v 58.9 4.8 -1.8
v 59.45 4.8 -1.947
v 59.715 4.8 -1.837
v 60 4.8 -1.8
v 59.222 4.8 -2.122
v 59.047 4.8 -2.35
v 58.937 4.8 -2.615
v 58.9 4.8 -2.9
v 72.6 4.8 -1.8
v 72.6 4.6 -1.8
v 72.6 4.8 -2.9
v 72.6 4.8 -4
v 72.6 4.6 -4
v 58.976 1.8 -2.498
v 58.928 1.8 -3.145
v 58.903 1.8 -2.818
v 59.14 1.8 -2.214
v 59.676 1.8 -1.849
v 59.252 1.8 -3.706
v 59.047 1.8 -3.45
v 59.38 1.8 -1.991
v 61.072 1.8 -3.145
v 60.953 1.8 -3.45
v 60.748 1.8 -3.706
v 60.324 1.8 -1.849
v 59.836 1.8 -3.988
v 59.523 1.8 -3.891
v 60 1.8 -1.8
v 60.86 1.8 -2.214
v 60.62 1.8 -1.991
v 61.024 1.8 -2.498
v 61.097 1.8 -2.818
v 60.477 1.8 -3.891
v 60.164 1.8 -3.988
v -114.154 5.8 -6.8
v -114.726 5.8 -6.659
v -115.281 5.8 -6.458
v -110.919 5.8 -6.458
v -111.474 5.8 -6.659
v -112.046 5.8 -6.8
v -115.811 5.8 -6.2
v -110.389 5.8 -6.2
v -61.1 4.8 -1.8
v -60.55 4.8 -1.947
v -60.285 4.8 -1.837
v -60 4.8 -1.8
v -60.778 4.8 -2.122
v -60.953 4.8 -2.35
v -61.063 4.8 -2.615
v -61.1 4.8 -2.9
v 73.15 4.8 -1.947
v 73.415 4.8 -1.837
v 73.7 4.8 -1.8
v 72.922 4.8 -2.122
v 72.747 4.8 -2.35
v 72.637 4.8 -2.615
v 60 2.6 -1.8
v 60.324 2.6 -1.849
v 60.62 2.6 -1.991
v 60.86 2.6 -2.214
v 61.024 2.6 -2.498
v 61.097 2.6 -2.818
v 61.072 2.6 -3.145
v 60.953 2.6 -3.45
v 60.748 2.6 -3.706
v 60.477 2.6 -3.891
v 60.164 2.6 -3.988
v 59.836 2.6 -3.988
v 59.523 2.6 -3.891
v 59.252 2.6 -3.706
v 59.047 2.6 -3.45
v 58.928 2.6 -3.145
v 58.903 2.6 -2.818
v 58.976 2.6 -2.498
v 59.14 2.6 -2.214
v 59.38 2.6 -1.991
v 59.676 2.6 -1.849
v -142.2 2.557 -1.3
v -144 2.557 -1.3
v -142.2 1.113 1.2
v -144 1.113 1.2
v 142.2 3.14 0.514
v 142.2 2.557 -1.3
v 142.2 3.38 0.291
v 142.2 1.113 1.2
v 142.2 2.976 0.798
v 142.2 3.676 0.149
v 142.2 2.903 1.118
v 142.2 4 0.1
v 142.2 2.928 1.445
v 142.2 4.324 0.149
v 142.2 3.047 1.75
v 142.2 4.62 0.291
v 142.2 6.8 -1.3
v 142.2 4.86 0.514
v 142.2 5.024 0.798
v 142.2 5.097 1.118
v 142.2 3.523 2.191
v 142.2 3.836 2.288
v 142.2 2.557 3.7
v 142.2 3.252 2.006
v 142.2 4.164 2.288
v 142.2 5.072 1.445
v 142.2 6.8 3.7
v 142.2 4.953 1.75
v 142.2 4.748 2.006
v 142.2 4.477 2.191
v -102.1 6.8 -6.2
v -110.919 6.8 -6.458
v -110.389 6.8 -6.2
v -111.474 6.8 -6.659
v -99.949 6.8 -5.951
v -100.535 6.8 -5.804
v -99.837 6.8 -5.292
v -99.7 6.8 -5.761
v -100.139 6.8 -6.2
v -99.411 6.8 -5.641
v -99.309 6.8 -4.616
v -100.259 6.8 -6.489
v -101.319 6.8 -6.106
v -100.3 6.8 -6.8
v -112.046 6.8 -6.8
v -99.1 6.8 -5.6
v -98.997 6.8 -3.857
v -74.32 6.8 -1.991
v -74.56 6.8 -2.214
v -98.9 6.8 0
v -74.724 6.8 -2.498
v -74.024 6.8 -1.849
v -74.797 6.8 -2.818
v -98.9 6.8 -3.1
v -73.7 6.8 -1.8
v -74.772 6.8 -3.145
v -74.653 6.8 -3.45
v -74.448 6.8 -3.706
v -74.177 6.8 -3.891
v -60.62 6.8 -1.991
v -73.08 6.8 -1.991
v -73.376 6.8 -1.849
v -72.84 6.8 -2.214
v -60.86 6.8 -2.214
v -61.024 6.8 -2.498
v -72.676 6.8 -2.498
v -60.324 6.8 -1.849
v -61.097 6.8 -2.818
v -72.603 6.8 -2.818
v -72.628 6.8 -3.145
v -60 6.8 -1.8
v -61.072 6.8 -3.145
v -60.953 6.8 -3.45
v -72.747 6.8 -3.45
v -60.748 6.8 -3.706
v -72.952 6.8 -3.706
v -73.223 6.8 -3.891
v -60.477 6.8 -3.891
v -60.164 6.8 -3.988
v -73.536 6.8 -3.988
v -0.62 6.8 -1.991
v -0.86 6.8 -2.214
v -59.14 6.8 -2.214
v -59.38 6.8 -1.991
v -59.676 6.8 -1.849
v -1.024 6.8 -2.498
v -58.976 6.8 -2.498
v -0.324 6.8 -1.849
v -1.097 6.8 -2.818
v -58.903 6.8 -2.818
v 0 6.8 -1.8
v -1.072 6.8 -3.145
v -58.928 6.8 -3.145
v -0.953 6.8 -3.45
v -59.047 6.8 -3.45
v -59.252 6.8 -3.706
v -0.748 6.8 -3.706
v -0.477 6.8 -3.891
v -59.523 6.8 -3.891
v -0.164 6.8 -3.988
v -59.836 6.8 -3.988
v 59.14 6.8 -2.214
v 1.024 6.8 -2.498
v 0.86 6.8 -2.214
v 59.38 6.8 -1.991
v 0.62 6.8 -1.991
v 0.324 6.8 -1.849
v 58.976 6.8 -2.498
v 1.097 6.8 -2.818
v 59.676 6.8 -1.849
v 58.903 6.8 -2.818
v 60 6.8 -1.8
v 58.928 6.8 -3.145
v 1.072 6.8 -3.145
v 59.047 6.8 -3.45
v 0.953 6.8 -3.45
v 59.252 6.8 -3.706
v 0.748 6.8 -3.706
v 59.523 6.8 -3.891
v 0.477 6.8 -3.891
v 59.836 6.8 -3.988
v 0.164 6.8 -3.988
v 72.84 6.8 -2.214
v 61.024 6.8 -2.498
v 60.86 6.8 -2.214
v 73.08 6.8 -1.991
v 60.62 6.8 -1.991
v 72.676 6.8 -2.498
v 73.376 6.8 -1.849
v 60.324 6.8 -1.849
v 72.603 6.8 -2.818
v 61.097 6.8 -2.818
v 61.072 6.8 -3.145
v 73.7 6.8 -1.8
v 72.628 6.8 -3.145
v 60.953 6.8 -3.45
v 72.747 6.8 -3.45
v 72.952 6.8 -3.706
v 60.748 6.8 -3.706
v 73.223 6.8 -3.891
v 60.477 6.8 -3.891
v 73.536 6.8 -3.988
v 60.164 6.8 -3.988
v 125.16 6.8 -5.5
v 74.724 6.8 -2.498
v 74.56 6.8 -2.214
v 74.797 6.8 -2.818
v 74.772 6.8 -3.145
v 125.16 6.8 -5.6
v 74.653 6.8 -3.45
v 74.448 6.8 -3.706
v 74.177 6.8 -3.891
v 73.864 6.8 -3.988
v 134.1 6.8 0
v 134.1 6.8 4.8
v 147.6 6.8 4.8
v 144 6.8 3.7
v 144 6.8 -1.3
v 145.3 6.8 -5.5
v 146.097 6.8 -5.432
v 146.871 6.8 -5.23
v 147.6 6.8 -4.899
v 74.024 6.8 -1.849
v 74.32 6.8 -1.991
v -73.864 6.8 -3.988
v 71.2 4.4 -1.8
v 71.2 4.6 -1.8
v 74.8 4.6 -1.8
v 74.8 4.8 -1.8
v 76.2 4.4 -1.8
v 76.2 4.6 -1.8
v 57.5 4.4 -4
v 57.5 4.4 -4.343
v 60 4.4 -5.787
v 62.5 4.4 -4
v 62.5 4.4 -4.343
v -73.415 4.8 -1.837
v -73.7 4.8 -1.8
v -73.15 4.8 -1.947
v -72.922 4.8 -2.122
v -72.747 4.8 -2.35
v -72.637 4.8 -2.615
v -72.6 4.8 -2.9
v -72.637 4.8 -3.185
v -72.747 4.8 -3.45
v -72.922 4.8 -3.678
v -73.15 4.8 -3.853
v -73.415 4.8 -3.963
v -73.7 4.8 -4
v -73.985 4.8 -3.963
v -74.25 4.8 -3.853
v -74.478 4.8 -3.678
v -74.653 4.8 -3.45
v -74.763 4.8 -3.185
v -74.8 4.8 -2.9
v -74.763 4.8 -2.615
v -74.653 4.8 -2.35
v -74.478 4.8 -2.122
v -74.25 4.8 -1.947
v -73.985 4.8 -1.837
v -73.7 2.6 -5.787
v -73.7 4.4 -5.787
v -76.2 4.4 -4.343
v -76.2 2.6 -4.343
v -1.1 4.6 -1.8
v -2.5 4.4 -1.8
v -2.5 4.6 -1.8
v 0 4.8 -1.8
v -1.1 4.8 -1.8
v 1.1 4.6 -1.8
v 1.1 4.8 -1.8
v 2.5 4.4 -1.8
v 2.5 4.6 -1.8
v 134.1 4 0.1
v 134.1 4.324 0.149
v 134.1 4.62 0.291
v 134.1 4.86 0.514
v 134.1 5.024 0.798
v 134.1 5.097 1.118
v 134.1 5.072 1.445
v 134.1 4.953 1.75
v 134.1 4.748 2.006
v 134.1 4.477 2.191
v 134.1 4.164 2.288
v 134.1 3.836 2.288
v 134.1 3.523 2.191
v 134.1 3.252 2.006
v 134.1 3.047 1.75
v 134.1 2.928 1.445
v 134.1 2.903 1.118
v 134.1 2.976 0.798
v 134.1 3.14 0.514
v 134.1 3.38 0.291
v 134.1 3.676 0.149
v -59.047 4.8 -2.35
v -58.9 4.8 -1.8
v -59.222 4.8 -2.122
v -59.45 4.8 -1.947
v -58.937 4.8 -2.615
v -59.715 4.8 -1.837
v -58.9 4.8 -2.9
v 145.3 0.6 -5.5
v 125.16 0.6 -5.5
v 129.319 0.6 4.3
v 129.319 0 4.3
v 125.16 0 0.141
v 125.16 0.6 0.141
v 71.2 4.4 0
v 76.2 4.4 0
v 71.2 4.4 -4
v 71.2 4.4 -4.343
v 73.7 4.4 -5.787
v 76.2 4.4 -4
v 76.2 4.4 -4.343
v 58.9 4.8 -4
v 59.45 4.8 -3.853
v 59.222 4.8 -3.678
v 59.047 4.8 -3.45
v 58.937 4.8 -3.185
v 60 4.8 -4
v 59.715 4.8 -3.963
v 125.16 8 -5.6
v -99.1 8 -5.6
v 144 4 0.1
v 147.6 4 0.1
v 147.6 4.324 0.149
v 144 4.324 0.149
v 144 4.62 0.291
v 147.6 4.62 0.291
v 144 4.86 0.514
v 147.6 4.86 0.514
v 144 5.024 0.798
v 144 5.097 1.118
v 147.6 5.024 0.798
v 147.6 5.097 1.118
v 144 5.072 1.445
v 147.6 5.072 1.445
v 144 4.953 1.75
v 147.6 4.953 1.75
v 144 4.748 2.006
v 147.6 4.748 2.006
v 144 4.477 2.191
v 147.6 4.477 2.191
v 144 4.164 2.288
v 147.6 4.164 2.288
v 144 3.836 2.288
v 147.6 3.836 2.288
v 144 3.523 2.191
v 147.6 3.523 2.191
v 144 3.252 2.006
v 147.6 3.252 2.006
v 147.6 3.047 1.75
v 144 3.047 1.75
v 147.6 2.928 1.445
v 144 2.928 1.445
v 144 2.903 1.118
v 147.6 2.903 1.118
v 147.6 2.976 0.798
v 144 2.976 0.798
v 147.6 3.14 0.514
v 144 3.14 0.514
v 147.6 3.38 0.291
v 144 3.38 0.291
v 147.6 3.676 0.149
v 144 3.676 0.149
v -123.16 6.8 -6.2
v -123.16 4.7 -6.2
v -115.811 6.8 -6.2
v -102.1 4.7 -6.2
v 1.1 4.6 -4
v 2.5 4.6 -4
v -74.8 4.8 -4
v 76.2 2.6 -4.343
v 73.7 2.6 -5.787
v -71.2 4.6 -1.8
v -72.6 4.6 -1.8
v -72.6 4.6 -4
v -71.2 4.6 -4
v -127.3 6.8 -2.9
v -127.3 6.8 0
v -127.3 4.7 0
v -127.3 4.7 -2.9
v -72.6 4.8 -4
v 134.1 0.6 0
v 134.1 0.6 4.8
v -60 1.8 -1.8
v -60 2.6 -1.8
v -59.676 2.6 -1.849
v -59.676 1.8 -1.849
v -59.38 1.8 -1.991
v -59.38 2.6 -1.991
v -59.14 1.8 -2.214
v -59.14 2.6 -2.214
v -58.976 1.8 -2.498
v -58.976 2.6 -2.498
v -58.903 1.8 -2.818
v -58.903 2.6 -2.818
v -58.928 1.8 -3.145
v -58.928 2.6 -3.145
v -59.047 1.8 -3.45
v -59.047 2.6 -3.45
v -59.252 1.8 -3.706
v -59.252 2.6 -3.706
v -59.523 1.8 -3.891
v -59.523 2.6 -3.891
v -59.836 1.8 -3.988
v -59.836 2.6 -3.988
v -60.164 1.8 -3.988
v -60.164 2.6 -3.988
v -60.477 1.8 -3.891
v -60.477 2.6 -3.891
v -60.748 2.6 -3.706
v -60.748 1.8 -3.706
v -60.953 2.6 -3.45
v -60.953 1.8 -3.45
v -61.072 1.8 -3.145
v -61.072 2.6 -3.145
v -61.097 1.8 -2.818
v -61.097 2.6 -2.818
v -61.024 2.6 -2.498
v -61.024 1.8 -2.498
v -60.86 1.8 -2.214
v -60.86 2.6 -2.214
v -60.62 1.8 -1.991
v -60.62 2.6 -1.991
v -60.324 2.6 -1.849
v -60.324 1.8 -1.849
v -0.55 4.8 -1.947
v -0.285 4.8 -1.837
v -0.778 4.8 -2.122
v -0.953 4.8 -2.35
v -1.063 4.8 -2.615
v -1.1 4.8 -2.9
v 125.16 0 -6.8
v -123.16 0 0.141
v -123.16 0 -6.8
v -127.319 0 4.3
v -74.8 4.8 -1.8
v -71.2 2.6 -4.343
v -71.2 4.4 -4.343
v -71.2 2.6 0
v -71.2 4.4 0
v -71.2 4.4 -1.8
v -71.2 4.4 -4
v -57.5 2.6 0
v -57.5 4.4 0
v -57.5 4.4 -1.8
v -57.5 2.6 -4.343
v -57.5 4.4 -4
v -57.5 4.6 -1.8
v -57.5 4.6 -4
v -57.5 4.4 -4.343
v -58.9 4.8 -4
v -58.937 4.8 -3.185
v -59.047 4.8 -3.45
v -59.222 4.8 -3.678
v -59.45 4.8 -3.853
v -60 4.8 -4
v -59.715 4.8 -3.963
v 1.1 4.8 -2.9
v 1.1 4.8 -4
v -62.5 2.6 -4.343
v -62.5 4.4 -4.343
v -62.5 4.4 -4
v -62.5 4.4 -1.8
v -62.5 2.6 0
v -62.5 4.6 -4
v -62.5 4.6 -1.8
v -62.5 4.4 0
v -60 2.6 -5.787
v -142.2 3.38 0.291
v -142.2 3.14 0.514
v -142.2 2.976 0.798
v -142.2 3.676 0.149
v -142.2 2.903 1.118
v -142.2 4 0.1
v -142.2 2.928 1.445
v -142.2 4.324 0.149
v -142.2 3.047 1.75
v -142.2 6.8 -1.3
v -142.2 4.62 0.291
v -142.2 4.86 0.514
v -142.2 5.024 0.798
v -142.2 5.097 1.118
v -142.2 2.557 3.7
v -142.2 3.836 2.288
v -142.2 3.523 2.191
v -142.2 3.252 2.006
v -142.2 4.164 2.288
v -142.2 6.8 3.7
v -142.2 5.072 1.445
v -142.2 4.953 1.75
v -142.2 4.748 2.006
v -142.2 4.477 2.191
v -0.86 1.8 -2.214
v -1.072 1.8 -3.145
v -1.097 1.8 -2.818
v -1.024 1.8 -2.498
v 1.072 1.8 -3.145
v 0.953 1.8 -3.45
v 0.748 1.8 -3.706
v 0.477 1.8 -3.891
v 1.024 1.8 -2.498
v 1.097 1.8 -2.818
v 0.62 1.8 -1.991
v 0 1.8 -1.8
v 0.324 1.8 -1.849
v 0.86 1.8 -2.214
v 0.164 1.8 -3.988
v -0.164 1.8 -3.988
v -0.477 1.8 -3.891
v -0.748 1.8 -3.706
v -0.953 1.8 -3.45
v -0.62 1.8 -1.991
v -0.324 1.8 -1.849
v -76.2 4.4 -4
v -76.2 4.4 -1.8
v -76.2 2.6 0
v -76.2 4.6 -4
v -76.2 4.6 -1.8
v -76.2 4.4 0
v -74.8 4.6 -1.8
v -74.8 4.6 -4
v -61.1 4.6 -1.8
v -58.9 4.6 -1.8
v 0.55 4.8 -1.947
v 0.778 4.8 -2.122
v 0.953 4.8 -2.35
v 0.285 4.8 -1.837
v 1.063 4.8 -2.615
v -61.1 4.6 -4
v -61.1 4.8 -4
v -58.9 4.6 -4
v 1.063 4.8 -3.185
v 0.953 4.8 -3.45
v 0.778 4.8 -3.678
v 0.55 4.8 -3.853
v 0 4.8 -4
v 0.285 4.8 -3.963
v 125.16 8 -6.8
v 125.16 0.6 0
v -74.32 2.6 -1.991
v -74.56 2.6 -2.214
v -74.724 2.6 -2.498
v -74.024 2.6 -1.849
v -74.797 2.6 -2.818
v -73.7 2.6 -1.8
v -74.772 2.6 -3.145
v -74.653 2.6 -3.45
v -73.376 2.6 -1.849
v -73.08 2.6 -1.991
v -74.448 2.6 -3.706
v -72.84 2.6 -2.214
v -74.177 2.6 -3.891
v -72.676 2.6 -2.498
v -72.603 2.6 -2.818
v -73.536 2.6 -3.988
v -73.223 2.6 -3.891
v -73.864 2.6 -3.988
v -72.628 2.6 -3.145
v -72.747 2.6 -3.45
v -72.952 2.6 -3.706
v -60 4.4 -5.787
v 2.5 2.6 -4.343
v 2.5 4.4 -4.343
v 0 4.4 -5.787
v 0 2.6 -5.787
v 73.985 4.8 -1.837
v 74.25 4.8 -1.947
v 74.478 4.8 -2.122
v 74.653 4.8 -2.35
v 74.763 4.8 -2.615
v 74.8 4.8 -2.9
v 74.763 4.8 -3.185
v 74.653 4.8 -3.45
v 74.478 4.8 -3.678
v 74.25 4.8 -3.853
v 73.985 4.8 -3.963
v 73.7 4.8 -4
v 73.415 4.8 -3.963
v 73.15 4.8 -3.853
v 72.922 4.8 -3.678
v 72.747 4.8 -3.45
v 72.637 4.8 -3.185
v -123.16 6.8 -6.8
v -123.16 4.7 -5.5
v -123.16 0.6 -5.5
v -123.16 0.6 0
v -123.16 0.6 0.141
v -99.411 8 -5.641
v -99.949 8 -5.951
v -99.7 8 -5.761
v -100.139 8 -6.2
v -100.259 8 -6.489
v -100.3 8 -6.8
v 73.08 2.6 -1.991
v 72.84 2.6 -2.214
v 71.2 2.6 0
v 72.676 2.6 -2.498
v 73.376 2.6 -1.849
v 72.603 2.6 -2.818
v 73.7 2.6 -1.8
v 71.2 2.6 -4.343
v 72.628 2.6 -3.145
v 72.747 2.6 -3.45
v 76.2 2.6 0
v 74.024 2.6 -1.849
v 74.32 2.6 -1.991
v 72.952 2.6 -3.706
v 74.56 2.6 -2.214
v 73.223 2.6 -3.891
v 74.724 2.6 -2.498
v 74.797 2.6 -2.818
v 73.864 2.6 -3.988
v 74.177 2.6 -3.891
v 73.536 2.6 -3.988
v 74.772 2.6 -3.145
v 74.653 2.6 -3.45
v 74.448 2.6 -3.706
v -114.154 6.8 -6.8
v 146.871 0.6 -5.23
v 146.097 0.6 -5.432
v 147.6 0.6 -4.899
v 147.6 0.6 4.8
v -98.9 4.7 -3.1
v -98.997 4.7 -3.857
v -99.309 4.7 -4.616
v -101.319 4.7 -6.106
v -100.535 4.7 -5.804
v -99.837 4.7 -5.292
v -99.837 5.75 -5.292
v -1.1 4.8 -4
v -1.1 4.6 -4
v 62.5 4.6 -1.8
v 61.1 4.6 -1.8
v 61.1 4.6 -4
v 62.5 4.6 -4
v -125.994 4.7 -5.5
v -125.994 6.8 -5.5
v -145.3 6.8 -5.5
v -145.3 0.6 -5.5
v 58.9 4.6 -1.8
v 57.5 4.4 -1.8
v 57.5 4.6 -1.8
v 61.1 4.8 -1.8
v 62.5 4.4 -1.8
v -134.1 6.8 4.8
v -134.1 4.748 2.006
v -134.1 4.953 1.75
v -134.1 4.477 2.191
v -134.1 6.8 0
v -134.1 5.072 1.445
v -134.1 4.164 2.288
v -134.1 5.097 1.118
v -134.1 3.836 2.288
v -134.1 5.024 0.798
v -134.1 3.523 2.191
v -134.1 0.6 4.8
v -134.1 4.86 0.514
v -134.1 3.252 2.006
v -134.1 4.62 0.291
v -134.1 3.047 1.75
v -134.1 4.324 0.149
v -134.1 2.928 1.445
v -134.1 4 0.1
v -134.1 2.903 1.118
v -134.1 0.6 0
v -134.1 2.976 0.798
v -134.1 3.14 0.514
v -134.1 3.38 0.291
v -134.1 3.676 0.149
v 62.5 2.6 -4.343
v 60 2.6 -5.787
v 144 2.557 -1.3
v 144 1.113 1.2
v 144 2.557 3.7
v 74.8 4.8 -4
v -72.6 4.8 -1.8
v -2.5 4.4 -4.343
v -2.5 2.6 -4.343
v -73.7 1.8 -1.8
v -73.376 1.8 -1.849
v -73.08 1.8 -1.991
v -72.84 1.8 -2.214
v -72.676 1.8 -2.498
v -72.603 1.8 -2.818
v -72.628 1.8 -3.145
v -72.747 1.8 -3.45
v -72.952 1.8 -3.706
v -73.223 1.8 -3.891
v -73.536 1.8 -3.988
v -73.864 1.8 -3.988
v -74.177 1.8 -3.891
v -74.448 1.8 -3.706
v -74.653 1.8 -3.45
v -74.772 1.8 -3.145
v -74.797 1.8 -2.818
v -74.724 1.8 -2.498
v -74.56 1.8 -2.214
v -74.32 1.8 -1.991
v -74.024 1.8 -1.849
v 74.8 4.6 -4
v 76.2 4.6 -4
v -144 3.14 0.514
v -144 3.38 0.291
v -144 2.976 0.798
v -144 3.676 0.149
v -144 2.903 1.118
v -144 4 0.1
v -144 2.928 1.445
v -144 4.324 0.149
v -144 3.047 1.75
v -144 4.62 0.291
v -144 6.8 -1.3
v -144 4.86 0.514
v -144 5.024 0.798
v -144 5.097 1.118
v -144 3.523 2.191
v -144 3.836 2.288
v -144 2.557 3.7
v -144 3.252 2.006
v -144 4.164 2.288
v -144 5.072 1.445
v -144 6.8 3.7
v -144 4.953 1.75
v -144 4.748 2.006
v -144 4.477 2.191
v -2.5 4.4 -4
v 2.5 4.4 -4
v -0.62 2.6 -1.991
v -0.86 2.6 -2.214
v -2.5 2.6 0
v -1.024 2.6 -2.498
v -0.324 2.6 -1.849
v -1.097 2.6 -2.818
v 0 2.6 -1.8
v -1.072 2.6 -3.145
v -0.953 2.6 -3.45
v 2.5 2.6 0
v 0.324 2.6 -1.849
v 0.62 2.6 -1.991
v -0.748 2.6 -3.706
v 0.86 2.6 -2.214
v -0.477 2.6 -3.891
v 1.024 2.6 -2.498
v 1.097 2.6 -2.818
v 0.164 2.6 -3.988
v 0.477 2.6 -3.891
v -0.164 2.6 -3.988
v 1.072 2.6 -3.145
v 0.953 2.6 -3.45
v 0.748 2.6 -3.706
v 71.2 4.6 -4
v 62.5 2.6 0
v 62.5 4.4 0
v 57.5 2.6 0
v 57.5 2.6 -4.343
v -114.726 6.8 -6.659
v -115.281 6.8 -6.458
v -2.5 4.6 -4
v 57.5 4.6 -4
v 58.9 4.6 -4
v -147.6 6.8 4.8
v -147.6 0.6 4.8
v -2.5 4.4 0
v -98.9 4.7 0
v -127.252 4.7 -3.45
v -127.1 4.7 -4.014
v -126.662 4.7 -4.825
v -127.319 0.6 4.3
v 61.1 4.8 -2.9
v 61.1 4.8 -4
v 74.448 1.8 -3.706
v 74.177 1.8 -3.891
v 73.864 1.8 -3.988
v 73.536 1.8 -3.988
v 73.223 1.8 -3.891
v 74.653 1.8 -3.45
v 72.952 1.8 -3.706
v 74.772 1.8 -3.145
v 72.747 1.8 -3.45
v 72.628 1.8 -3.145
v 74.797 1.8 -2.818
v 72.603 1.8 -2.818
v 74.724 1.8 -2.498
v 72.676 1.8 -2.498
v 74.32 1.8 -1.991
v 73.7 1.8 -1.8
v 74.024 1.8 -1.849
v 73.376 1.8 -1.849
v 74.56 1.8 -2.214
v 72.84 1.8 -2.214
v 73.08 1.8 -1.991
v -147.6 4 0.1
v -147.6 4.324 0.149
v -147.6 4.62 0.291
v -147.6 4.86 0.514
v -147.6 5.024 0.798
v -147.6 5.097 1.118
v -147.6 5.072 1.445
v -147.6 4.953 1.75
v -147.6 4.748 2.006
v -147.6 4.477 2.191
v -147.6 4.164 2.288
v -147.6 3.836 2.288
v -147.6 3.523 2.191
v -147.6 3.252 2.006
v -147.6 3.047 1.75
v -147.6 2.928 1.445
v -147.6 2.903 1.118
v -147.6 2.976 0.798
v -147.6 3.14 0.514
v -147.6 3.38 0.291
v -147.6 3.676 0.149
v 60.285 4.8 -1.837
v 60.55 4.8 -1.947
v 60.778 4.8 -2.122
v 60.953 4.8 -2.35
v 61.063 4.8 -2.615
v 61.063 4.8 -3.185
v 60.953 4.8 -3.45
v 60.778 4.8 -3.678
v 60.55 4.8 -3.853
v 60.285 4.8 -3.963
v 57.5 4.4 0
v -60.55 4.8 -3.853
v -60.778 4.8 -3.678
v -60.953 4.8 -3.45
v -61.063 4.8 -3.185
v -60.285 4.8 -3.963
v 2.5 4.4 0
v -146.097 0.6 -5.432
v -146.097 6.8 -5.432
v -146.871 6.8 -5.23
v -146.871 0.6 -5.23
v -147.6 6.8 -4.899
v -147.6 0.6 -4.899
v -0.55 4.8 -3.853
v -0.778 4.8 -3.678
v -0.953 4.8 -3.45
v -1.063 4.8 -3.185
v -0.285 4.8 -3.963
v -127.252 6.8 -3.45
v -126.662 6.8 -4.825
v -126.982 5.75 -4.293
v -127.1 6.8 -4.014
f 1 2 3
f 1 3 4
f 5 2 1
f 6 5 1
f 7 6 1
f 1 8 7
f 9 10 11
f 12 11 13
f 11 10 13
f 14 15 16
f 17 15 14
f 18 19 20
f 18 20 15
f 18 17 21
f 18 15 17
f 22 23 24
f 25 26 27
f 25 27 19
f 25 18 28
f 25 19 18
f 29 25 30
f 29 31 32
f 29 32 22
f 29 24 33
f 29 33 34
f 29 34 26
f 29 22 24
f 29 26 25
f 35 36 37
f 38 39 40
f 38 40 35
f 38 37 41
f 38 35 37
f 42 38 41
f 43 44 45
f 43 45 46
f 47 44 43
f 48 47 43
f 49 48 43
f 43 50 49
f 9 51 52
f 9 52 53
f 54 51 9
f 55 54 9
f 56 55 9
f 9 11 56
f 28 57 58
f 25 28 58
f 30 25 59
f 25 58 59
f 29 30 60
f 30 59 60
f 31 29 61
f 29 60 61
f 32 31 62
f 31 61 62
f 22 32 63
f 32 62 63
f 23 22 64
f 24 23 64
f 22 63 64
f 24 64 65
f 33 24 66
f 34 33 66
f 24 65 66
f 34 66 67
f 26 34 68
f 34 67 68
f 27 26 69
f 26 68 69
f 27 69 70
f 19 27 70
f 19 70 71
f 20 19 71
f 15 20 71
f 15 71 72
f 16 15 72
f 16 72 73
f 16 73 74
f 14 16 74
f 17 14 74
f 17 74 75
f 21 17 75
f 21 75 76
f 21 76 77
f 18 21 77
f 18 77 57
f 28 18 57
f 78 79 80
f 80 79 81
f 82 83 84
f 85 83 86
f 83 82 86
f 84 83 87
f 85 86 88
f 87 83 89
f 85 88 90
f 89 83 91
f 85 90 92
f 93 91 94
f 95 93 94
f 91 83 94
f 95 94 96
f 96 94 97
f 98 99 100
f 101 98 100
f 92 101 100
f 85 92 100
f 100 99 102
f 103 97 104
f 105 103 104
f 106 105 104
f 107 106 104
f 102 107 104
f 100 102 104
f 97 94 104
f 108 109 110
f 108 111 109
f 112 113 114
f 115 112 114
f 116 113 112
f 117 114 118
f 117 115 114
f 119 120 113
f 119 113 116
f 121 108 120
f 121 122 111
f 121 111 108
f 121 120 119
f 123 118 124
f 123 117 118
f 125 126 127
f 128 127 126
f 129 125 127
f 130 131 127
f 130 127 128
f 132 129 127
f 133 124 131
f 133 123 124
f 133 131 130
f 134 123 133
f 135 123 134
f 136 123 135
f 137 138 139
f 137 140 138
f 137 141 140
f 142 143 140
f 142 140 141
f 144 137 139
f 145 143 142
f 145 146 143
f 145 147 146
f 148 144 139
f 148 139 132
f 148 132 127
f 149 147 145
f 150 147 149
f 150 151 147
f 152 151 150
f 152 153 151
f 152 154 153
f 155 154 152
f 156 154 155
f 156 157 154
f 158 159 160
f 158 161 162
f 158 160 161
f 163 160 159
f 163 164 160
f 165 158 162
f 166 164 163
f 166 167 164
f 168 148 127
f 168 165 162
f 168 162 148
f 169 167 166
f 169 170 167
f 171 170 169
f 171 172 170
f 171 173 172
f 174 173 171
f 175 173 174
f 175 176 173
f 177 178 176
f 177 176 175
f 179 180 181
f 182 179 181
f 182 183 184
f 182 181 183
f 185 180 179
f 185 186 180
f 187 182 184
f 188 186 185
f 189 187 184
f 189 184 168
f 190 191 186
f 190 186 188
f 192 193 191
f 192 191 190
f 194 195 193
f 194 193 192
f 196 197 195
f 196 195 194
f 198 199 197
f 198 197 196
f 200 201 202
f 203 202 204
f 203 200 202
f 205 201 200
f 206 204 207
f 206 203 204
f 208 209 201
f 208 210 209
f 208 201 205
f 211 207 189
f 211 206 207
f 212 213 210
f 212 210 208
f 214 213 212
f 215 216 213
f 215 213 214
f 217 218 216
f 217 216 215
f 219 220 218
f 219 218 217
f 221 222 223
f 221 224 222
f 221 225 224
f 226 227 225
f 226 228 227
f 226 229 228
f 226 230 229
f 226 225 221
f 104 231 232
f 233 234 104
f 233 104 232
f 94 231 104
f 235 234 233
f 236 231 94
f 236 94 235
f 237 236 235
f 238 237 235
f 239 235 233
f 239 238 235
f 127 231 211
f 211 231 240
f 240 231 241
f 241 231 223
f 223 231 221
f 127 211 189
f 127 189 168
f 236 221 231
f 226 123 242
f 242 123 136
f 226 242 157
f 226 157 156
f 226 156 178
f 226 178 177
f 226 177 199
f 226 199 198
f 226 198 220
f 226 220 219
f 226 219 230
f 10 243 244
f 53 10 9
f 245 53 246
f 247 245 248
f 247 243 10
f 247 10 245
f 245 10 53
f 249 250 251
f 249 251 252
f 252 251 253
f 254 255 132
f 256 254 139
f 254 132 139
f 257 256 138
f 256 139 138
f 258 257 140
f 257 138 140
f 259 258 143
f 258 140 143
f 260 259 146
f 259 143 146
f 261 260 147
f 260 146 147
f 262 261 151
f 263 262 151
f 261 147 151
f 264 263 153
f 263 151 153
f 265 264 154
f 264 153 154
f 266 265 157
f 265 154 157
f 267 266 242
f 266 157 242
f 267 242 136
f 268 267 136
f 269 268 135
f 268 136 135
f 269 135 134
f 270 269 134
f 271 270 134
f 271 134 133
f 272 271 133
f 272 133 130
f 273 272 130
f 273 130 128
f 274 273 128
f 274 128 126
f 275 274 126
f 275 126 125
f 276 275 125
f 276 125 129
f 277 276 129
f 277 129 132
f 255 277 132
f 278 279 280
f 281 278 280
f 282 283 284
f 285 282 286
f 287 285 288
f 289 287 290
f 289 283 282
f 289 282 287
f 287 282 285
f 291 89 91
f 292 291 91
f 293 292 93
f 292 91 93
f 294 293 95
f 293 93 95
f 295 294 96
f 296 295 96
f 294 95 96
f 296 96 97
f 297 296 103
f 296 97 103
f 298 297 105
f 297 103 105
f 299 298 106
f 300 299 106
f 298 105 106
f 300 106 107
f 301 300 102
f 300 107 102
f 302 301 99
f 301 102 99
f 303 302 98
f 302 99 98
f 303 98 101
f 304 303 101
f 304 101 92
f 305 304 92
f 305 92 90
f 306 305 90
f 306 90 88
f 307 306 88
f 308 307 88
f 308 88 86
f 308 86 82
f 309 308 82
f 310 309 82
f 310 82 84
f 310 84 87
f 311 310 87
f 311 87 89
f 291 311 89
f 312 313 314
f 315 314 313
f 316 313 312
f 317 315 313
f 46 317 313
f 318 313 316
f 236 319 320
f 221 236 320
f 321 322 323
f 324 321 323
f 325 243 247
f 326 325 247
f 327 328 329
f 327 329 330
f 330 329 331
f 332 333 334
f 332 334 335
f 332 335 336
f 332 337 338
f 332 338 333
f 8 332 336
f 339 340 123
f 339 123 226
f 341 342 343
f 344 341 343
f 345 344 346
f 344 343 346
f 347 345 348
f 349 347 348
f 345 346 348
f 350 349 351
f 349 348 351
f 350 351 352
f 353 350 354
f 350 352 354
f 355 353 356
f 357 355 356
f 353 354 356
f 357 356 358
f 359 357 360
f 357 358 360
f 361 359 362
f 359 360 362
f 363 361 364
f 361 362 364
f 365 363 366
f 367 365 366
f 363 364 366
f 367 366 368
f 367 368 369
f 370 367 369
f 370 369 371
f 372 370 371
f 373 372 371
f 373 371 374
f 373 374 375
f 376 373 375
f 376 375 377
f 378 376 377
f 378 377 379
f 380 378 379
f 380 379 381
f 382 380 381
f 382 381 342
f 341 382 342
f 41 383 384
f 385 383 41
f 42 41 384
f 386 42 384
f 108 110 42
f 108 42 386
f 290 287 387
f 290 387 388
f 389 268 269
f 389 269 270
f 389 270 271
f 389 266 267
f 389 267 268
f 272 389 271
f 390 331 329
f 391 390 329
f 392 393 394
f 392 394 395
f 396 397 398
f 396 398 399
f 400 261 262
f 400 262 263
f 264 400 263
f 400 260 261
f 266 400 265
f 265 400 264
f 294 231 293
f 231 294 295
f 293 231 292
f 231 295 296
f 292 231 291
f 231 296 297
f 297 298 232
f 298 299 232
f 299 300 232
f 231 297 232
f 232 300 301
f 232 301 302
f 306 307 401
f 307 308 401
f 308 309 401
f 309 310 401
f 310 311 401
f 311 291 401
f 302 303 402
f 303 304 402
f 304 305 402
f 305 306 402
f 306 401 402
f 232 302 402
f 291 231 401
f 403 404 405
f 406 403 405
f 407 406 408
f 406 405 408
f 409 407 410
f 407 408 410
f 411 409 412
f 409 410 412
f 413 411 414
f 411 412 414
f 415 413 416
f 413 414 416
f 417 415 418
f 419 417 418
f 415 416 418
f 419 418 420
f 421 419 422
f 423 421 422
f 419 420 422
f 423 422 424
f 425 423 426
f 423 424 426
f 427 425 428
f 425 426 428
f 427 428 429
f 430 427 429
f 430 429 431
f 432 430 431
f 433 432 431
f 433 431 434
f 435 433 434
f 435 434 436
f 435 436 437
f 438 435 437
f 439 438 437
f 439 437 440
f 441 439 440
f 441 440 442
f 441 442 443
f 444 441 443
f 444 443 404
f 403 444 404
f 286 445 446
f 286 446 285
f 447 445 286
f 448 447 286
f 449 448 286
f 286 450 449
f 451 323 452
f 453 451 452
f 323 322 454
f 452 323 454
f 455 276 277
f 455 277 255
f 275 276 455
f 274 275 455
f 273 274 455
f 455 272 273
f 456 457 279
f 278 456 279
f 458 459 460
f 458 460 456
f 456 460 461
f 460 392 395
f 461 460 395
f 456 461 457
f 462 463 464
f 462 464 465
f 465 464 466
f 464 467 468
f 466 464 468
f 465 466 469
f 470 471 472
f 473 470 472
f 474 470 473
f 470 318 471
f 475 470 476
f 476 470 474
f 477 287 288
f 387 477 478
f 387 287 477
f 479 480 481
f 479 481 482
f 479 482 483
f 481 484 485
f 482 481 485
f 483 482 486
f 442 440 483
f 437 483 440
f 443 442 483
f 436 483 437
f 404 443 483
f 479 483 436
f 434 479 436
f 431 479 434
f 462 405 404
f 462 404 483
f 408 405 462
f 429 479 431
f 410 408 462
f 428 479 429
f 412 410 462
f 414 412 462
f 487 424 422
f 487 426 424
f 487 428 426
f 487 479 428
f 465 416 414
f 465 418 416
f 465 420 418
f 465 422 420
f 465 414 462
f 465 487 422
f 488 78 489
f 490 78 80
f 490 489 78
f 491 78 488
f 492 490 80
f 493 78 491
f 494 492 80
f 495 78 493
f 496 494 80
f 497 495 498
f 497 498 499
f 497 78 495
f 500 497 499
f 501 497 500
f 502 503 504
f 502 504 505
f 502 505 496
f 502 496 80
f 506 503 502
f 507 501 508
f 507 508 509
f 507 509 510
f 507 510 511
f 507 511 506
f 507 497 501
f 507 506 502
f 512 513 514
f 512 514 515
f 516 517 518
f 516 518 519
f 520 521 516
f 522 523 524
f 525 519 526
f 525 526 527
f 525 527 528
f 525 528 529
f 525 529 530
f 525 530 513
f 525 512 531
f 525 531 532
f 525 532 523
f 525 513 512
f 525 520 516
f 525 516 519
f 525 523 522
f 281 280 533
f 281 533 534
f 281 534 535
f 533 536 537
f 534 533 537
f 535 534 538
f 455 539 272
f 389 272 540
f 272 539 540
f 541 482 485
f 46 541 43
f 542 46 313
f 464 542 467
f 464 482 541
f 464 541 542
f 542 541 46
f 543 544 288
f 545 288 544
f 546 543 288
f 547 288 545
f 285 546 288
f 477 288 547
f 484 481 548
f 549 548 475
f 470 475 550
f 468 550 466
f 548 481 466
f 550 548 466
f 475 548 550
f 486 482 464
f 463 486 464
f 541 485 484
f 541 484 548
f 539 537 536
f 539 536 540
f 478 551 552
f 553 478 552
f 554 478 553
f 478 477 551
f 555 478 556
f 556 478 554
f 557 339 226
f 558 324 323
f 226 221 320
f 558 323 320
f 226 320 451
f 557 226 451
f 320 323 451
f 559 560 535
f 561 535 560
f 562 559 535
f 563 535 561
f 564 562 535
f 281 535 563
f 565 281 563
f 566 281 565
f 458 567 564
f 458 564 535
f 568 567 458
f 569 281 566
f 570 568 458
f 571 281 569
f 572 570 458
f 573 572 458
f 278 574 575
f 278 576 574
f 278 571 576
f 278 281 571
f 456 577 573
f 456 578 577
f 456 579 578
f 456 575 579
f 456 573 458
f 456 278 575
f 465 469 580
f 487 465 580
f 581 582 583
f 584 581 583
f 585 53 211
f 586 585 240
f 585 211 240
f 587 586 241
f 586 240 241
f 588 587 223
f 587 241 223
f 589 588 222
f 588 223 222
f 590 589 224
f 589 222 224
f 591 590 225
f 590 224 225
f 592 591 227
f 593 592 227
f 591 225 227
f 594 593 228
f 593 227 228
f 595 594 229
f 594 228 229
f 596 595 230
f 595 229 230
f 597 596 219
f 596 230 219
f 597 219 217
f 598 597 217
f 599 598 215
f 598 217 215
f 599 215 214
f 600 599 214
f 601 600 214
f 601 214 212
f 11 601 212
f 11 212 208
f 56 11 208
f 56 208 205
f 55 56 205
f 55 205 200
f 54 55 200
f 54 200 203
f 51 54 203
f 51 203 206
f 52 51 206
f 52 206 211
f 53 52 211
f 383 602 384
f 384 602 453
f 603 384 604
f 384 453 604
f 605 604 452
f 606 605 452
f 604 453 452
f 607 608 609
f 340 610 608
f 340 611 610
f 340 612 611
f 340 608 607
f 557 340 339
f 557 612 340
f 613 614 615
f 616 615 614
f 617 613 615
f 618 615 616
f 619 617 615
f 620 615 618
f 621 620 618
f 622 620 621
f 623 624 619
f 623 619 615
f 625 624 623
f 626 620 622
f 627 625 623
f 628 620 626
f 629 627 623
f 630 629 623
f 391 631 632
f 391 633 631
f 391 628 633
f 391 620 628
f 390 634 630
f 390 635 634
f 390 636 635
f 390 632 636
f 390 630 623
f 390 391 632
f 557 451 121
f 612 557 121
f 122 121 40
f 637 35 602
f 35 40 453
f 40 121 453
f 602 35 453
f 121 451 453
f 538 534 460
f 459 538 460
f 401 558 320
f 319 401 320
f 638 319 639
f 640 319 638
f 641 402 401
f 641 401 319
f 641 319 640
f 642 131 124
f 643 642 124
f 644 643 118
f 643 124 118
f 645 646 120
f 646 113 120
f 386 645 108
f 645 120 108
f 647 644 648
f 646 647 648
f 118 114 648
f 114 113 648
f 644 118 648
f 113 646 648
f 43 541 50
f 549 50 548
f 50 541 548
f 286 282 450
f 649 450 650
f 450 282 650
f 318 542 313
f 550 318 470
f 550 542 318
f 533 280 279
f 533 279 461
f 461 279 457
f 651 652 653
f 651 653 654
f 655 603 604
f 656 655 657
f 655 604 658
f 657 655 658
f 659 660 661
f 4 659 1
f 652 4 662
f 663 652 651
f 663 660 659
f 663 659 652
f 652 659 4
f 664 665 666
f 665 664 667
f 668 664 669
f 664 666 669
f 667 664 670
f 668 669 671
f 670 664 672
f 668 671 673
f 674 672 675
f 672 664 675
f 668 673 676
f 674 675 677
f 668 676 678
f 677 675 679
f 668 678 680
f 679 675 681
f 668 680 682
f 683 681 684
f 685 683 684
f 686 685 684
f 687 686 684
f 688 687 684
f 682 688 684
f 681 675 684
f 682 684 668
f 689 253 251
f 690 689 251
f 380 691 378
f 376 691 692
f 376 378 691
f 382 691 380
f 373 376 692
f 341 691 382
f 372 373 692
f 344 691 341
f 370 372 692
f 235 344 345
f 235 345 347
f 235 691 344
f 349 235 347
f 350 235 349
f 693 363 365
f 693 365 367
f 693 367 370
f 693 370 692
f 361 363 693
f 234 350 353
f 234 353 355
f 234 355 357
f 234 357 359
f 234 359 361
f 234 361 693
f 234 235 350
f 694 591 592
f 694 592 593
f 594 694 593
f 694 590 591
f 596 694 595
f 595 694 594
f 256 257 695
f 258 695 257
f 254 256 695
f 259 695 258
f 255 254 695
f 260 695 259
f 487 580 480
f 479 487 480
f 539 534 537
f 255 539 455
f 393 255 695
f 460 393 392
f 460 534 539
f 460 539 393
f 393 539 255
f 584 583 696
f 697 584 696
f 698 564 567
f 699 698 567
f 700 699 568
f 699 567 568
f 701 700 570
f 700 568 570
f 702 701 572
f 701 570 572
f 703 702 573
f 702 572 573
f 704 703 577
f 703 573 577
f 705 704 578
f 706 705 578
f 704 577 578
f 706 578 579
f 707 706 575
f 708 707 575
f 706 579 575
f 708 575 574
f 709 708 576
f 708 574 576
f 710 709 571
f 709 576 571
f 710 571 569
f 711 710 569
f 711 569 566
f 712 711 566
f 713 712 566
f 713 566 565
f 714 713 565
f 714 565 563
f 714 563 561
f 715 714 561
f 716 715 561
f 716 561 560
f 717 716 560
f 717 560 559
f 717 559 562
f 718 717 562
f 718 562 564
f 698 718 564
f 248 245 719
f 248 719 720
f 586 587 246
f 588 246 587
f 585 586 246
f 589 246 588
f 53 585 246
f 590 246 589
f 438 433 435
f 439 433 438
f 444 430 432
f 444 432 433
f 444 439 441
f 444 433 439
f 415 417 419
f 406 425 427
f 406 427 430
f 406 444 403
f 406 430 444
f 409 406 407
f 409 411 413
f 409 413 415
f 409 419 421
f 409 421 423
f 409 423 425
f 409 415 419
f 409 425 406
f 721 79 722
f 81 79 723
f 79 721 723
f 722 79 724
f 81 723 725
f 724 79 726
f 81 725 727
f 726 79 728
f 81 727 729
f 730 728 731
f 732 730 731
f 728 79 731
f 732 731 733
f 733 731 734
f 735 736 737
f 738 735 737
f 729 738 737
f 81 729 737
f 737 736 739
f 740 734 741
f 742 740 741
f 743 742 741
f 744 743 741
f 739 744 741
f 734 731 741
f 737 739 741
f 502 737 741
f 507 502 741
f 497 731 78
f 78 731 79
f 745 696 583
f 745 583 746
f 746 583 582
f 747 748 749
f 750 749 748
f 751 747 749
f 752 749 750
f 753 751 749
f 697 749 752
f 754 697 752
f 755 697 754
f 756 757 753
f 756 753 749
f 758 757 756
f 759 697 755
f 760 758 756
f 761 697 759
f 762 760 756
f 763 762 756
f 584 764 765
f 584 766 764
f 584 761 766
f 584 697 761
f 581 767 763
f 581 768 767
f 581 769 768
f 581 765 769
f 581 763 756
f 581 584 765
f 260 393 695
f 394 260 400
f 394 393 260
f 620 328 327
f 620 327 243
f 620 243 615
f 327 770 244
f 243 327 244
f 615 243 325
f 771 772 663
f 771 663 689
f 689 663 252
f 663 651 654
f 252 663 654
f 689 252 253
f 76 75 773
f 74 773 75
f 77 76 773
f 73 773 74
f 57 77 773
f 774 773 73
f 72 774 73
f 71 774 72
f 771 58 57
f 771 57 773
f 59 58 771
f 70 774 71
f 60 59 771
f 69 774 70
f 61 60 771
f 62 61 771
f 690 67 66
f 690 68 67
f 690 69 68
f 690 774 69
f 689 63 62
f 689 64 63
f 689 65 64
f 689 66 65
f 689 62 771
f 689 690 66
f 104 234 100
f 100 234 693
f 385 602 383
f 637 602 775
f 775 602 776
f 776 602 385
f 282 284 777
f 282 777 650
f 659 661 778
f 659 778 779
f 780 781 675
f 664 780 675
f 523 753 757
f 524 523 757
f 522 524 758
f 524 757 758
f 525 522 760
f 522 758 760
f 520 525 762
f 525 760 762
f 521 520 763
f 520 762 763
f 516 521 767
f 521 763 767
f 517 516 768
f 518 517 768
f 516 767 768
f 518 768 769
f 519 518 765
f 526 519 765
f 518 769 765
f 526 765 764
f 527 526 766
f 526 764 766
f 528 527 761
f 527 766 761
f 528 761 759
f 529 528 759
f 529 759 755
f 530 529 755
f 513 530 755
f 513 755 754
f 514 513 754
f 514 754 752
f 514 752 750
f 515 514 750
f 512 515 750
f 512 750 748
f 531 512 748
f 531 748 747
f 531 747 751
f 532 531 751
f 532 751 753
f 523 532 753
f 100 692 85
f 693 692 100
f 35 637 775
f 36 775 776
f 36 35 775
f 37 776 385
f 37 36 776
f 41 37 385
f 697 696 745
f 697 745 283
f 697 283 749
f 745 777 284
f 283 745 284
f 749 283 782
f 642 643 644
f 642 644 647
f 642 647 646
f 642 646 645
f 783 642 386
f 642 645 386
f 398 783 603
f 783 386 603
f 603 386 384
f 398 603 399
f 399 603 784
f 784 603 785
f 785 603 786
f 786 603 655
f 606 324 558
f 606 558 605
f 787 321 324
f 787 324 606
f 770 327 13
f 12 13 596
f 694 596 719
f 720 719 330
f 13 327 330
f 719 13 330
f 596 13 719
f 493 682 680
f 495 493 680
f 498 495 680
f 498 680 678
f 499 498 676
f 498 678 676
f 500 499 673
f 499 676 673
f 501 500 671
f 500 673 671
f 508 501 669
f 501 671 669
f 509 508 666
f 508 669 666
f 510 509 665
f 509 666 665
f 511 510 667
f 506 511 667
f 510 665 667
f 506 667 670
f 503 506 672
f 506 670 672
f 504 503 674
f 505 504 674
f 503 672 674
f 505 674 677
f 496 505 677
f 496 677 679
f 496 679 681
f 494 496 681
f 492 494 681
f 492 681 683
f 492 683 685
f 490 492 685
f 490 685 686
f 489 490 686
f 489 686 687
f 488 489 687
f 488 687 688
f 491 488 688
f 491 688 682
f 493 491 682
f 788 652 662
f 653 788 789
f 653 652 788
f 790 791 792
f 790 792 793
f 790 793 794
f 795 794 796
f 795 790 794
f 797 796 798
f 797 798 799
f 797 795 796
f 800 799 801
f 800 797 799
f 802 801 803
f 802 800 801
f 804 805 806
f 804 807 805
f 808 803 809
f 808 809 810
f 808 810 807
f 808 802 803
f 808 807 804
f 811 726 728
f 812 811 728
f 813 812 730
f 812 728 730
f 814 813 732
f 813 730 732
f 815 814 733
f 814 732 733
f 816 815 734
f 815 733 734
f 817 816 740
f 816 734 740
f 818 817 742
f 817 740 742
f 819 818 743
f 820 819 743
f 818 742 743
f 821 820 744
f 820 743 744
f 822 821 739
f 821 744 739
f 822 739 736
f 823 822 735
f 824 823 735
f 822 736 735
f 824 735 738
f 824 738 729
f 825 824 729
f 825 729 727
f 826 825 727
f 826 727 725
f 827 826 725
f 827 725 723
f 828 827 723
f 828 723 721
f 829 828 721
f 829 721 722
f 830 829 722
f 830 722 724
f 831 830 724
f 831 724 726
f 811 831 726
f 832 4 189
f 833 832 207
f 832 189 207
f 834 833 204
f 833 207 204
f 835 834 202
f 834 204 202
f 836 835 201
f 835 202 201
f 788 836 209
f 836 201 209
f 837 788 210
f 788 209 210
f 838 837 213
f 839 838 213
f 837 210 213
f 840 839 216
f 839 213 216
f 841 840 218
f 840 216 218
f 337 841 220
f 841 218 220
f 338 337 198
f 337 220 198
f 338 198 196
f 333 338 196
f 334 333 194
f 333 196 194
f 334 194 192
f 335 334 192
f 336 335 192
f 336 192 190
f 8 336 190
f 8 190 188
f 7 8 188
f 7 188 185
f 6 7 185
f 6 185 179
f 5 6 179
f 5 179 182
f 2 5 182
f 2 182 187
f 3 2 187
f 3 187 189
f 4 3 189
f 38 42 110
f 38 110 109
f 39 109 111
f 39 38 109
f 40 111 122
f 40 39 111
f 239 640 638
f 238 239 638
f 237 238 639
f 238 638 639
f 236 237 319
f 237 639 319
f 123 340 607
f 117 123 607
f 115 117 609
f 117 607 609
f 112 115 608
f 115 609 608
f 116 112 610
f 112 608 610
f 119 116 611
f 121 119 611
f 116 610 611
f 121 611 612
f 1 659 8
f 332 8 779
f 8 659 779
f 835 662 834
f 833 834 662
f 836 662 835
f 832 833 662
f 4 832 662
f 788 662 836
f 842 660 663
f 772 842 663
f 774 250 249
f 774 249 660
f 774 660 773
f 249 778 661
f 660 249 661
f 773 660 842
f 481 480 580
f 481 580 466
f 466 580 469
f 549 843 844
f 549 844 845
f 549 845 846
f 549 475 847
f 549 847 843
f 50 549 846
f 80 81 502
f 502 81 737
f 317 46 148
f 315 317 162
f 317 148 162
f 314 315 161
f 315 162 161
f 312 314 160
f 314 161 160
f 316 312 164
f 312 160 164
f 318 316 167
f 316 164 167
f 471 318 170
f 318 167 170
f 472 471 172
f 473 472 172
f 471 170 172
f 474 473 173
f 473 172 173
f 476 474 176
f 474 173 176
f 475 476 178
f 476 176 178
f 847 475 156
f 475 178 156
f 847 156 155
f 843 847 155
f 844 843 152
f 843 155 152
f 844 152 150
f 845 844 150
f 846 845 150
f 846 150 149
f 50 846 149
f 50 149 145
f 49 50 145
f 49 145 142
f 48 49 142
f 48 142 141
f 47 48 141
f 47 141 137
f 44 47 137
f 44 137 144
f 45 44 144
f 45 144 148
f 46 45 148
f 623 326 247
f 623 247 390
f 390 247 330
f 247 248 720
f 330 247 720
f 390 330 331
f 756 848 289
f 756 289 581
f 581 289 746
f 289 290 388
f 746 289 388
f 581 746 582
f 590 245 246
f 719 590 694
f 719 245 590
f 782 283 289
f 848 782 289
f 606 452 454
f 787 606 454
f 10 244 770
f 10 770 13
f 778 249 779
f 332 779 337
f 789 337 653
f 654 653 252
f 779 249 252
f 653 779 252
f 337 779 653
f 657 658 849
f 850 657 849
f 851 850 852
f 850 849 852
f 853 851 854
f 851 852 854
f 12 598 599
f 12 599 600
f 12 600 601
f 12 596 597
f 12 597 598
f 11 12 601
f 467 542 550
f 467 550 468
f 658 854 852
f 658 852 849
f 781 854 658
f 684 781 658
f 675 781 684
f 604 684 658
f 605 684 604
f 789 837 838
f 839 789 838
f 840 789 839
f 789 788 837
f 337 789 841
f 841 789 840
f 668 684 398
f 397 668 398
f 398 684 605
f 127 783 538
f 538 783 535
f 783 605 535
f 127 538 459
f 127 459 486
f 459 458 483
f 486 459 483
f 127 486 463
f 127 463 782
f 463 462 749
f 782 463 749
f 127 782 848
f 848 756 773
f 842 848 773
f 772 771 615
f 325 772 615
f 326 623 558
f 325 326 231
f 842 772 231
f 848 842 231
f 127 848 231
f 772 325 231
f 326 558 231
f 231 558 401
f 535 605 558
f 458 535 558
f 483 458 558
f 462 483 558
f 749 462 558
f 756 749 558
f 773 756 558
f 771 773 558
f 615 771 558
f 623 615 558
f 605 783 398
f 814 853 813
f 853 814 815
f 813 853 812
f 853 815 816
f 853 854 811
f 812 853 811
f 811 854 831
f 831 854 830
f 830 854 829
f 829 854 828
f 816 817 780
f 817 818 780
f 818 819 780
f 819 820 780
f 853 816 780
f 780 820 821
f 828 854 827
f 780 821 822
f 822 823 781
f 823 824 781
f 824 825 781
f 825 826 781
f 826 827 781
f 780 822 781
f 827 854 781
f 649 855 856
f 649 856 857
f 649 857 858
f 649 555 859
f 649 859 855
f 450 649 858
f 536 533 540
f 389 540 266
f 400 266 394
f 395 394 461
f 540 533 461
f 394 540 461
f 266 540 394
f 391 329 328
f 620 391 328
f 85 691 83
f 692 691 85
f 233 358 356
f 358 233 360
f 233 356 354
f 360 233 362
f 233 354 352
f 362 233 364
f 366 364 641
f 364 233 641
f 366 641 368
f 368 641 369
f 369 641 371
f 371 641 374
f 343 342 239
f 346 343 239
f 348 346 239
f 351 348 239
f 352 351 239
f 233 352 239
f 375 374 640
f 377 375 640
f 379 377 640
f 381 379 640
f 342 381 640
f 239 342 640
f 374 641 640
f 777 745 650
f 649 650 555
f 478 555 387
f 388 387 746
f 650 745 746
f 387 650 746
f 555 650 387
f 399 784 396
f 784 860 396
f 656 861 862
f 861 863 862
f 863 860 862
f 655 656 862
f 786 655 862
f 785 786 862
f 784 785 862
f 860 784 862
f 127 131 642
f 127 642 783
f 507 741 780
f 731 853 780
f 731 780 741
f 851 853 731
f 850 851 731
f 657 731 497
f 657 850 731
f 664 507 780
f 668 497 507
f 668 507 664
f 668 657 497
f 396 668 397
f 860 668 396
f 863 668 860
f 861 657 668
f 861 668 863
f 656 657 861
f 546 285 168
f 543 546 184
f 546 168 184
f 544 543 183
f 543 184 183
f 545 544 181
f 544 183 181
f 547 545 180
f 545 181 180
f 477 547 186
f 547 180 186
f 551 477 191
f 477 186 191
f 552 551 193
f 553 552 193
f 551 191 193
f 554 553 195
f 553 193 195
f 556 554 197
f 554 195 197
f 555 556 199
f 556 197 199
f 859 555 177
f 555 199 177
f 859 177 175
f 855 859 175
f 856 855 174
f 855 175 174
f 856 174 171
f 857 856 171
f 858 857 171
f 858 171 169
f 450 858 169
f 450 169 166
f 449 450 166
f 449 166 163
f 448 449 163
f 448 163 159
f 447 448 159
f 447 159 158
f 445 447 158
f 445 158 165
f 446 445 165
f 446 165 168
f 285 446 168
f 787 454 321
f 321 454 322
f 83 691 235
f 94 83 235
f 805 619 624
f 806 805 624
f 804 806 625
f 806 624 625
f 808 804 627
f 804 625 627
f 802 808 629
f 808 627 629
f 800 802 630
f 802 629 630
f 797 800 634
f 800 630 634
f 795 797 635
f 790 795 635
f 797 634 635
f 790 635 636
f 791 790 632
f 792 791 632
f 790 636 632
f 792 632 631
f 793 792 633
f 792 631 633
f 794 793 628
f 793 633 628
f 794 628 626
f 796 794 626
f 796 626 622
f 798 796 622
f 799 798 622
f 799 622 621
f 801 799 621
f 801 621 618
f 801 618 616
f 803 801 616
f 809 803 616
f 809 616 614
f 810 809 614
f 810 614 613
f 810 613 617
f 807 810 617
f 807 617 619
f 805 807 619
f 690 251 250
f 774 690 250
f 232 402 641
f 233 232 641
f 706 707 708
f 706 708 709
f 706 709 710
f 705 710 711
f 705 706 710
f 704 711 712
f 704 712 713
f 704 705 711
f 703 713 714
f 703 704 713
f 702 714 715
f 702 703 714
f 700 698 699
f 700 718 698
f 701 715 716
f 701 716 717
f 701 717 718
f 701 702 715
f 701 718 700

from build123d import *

# Parameters (mm, degrees)
BOSS_EXTRUDE1_DEPTH = 8
SKETCH2_W           = 22.44
SKETCH2_H           = 10.3
CUT_EXTRUDE1_DEPTH  = 0.6
SKETCH3_W           = 24.44
SKETCH3_H           = 10.3
CUT_EXTRUDE2_DEPTH  = 0.6
BOSS_EXTRUDE2_DEPTH = 0.6
SKETCH5_R           = 1.1
CUT_EXTRUDE3_DEPTH  = 296.386661852
CUT_EXTRUDE4_START  = -3.6
CUT_EXTRUDE4_DEPTH  = 1.8
CUT_EXTRUDE5_START  = -3.6
CUT_EXTRUDE5_DEPTH  = 1.8
SKETCH8_W           = 295.2
SKETCH8_H           = 10.4
CUT_EXTRUDE6_DEPTH  = 1.2
CUT_EXTRUDE7_START  = -2.4
CUT_EXTRUDE7_DEPTH  = 1.8
SKETCH10_R          = 1.1
CUT_EXTRUDE8_DEPTH  = 5
SKETCH11_W          = 5
SKETCH11_H          = 2.2
CUT_EXTRUDE9_DEPTH  = 0.2
SKETCH12_W          = 2.2
SKETCH12_H          = 2.2
CUT_EXTRUDE10_DEPTH = 0.2
CUT_EXTRUDE11_DEPTH = 1.2
CUT_EXTRUDE12_DEPTH = 2.1
CUT_EXTRUDE13_START = 1.1
SKETCH15_R          = 5.6
CUT_EXTRUDE13_DEPTH = 1


with BuildPart() as part:
    # Sketch1 → Boss-Extrude1 (new body)
    with BuildSketch(Plane(origin=(0, 0, 0), x_dir=(1, 0, 0), z_dir=(0, 1, 0))):
        with BuildLine():
            Line((-134.1, 0), (134.1, 0))
            Line((134.1, 0), (134.1, -4.8))
            Line((134.1, -4.8), (147.6, -4.8))
            Line((147.6, -4.8), (147.6, 4.898780306))
            ThreePointArc((147.6, 4.898780306), (146.488640518, 5.347211642), (145.3, 5.5))
            Line((145.3, 5.5), (125.16, 5.5))
            Line((125.16, 5.5), (125.16, 6.8))
            Line((125.16, 6.8), (-123.16, 6.8))
            Line((-123.16, 6.8), (-123.16, 5.5))
            Line((-123.16, 5.5), (-145.3, 5.5))
            ThreePointArc((-145.3, 5.5), (-146.488640518, 5.347211642), (-147.6, 4.898780306))
            Line((-147.6, 4.898780306), (-147.6, -4.8))
            Line((-147.6, -4.8), (-134.1, -4.8))
            Line((-134.1, -4.8), (-134.1, 0))
        make_face()
    extrude(amount=BOSS_EXTRUDE1_DEPTH)

    # Sketch2 → Cut-Extrude1 (cut)
    with BuildSketch(Plane.XZ):
        with Locations((136.38, -0.35)):
            Rectangle(SKETCH2_W, SKETCH2_H)
    extrude(amount=-CUT_EXTRUDE1_DEPTH, mode=Mode.SUBTRACT)

    # Sketch3 → Cut-Extrude2 (cut)
    with BuildSketch(Plane.XZ):
        with Locations((-135.38, -0.35)):
            Rectangle(SKETCH3_W, SKETCH3_H)
    extrude(amount=-CUT_EXTRUDE2_DEPTH, mode=Mode.SUBTRACT)

    # Sketch4 → Boss-Extrude2 (add)
    with BuildSketch(Plane.XZ):
        Polygon((129.318578644, 4.3), (125.16, 0.141421356), (125.16, 0), (-123.16, 0), (-123.16, 0.141421356), (-127.318578644, 4.3), align=None)
    extrude(amount=-BOSS_EXTRUDE2_DEPTH)

    # Sketch5 → Cut-Extrude3 (cut, through all)
    with BuildSketch(Plane(origin=(147.6, 0, 0), x_dir=(0, 0, -1), z_dir=(1, 0, 0))):
        with Locations((-1.2, 4)):
            Circle(SKETCH5_R)
    extrude(amount=-CUT_EXTRUDE3_DEPTH, mode=Mode.SUBTRACT)

    # Sketch6 → Cut-Extrude4 (cut)
    with BuildSketch(Plane(origin=(147.6, 0, 0), x_dir=(0, 0, -1), z_dir=(1, 0, 0)).offset(CUT_EXTRUDE4_START)):
        Polygon((-3.7, 5.443375673), (-3.7, 8), (1.3, 8), (1.3, 5.443375673), (1.3, 2.556624327), (-1.2, 1.113248654), (-3.7, 2.556624327), align=None)
    extrude(amount=-CUT_EXTRUDE4_DEPTH, mode=Mode.SUBTRACT)

    # Sketch7 → Cut-Extrude5 (cut)
    with BuildSketch(Plane.ZY.offset(147.6).offset(CUT_EXTRUDE5_START)):
        Polygon((-1.3, 8), (-1.3, 2.556624327), (1.2, 1.113248654), (3.7, 2.556624327), (3.7, 8), align=None)
    extrude(amount=-CUT_EXTRUDE5_DEPTH, mode=Mode.SUBTRACT)

    # Sketch8 → Cut-Extrude6 (cut)
    with BuildSketch(Plane(origin=(0, 8, 0), x_dir=(1, 0, 0), z_dir=(0, 1, 0))):
        with Locations((0, 0.4)):
            Rectangle(SKETCH8_W, SKETCH8_H)
    extrude(amount=-CUT_EXTRUDE6_DEPTH, mode=Mode.SUBTRACT)

    # Sketch9 → Cut-Extrude7 (cut)
    with BuildSketch(Plane(origin=(0, 6.8, 0), x_dir=(1, 0, 0), z_dir=(0, 1, 0)).offset(CUT_EXTRUDE7_START)):
        Polygon((-71.2, 1.456624327), (-71.2, 4.343375673), (-73.7, 5.786751346), (-76.2, 4.343375673), (-76.2, 1.456624327), (-76.2, 0), (-71.2, 0), align=None)
        Polygon((76.2, 1.456624327), (76.2, 4.343375673), (73.7, 5.786751346), (71.2, 4.343375673), (71.2, 1.456624327), (71.2, 0), (76.2, 0), align=None)
        Polygon((-57.5, 1.456624327), (-57.5, 4.343375673), (-60, 5.786751346), (-62.5, 4.343375673), (-62.5, 1.456624327), (-62.5, 0), (-57.5, 0), align=None)
        Polygon((2.5, 1.456624327), (2.5, 4.343375673), (0, 5.786751346), (-2.5, 4.343375673), (-2.5, 1.456624327), (-2.5, 0), (2.5, 0), align=None)
        Polygon((62.5, 1.456624327), (62.5, 4.343375673), (60, 5.786751346), (57.5, 4.343375673), (57.5, 1.456624327), (57.5, 0), (62.5, 0), align=None)
    extrude(amount=-CUT_EXTRUDE7_DEPTH, mode=Mode.SUBTRACT)

    # Sketch10 → Cut-Extrude8 (cut)
    with BuildSketch(Plane(origin=(0, 6.8, 0), x_dir=(1, 0, 0), z_dir=(0, 1, 0))):
        with Locations(Location((-73.7, 2.9, 0), (0, 0, 270))):
            Circle(SKETCH10_R)
        with Locations(Location((73.7, 2.9, 0), (0, 0, 270))):
            Circle(SKETCH10_R)
        with Locations(Location((60, 2.9, 0), (0, 0, 270))):
            Circle(SKETCH10_R)
        with Locations(Location((0, 2.9, 0), (0, 0, 270))):
            Circle(SKETCH10_R)
        with Locations(Location((-60, 2.9, 0), (0, 0, 270))):
            Circle(SKETCH10_R)
    extrude(amount=-CUT_EXTRUDE8_DEPTH, mode=Mode.SUBTRACT)

    # Sketch11 → Cut-Extrude9 (cut)
    with BuildSketch(Plane.XZ.offset(-4.4)):
        with Locations((73.7, -2.9)):
            Rectangle(SKETCH11_W, SKETCH11_H)
        with Locations((60, -2.9)):
            Rectangle(SKETCH11_W, SKETCH11_H)
        with Locations((0, -2.9)):
            Rectangle(SKETCH11_W, SKETCH11_H)
        with Locations((-60, -2.9)):
            Rectangle(SKETCH11_W, SKETCH11_H)
        with Locations((-73.7, -2.9)):
            Rectangle(SKETCH11_W, SKETCH11_H)
    extrude(amount=-CUT_EXTRUDE9_DEPTH, mode=Mode.SUBTRACT)

    # Sketch12 → Cut-Extrude10 (cut)
    with BuildSketch(Plane(origin=(0, 4.6, 0), x_dir=(-1, 0, 0), z_dir=(0, -1, 0))):
        with Locations((73.7, 2.9)):
            Rectangle(SKETCH12_W, SKETCH12_H)
        with Locations((60, 2.9)):
            Rectangle(SKETCH12_W, SKETCH12_H)
        with Locations((0, 2.9)):
            Rectangle(SKETCH12_W, SKETCH12_H)
        with Locations((-60, 2.9)):
            Rectangle(SKETCH12_W, SKETCH12_H)
        with Locations((-73.7, 2.9)):
            Rectangle(SKETCH12_W, SKETCH12_H)
    extrude(amount=-CUT_EXTRUDE10_DEPTH, mode=Mode.SUBTRACT)

    # Sketch13 → Cut-Extrude11 (cut)
    with BuildSketch(Plane(origin=(0, 8, 0), x_dir=(1, 0, 0), z_dir=(0, 1, 0))):
        with BuildLine():
            Line((-100.3, 6.8), (-123.16, 6.8))
            Line((-123.16, 6.8), (-123.16, 5.5))
            Line((-123.16, 5.5), (-99.1, 5.6))
            ThreePointArc((-99.1, 5.6), (-99.948528137, 5.951471863), (-100.3, 6.8))
        make_face()
    extrude(amount=-CUT_EXTRUDE11_DEPTH, mode=Mode.SUBTRACT)

    # Sketch14 → Cut-Extrude12 (cut)
    with BuildSketch(Plane(origin=(0, 6.8, 0), x_dir=(1, 0, 0), z_dir=(0, 1, 0))):
        with BuildLine():
            Line((-98.9, 0), (-127.3, 0))
            Line((-127.3, 0), (-127.3, 2.9))
            add(Edge.make_bspline(
                [(-123.9, 6.2), (-127.3, 6.2), (-127.3, 2.9)],
                knots=[4.71238898, 4.71238898, 4.71238898, 6.283185307, 6.283185307, 6.283185307], degree=2, weights=[1, 0.707106781, 1]))
            Line((-123.9, 6.2), (-102.1, 6.2))
            add(Edge.make_bspline(
                [(-98.9, 3.1), (-98.9, 6.2), (-102.1, 6.2)],
                knots=[3.141592654, 3.141592654, 3.141592654, 4.71238898, 4.71238898, 4.71238898], degree=2, weights=[1, 0.707106781, 1]))
            Line((-98.9, 3.1), (-98.9, 0))
        make_face()
    extrude(amount=-CUT_EXTRUDE12_DEPTH, mode=Mode.SUBTRACT)

    # Sketch15 → Cut-Extrude13 (cut)
    with BuildSketch(Plane(origin=(0, 4.7, 0), x_dir=(1, 0, 0), z_dir=(0, 1, 0)).offset(CUT_EXTRUDE13_START)):
        with Locations((-113.1, 1.3)):
            Circle(SKETCH15_R)
    extrude(amount=CUT_EXTRUDE13_DEPTH, mode=Mode.SUBTRACT)


solid = part.part
